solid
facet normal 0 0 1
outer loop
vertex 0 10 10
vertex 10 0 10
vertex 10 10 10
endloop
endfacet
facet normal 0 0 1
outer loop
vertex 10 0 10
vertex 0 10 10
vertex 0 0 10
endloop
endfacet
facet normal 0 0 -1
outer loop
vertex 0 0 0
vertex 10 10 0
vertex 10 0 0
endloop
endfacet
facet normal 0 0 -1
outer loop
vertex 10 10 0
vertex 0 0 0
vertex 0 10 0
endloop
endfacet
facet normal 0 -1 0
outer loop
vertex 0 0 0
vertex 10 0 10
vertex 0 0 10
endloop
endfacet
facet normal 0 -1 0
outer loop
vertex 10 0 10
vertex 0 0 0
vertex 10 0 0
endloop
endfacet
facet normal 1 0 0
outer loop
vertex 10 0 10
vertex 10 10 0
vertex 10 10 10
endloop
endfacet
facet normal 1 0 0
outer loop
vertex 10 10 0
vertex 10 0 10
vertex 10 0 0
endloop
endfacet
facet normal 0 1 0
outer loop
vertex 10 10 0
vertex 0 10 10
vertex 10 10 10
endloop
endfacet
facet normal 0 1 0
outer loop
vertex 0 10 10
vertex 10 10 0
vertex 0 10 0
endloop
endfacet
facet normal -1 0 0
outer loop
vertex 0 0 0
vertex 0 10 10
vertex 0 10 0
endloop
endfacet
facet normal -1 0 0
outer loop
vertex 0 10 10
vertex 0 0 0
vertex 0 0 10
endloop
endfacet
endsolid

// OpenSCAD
/*
 * Welcome to the Advent Calendar - Tutorial Edition - Part 01
 */

// This part will introduce how the tutorial is structured,so please hang
// in there for more interesting things to come over the following days.

// The tutorial has 15 parts, with each part containing multiple steps
// introducing features, or tips & tricks on how to use OpenSCAD.

// In the top of the script there's going to be a "step" variable that
// allows selecting the step that should be shown in the 3D View (or
// maybe sometimes in the Console Window).

step = 1; // [1:3]

/*** STEP 1 ***/

// In step 1 of this introduction, we will start with the classic
// "Hello World" example most computer language introductions start with
// (https://en.wikipedia.org/wiki/%22Hello,_World!%22_program).
//
// As we are in the world of 3D geometry, we will not actually use words,
// but one of the simplest geometric primitive, The Cube.
//
// OpenSCAD does not define any real world units, so we don't have
// millimeters, inches and so on. It's just a number, or maybe call it
// OpenSCAD units.
//
// Note that our cube is touching the origin (the point where all 3
// coordinates are zero) with one corner. The cube is fully in the first
// octant with all positive coordinates.
// https://en.wikipedia.org/wiki/Octant_(solid_geometry)
//
// => Press the F5 key (Preview) to show the cube.
// => Use the mouse in the 3D view to move and rotate the camera
// => Try the zoom and reset-view buttons below the 3D view
//
// Rotation: Click and hold the left mouse button in in the 3D
// view. Dragging the mouse will rotate the camera.
//
// Translation:  Click and hold the right mouse button. Dragging the
// mouse will move the camera left/right or up/down.
//
// Zoom: Using the mouse wheel, the distance between the camera and the
// model can be changed. This will zoom-in or zoom-out depending on the
// rotation direction of the mouse wheel.

if (step == 1) {

cube(10); // A cube with edges of 10 units.

}

/*** STEP 2 ***/

// In step 2, we have the same cube again, but instead of touching the
// origin with one corner, it's centered around the origin, so each of
// the corners of the cube is in a different octant.
//
// => Change the "step = 1" to "step = 2" at the top of the file
// => Press F5 to show the cube of step 2
//
// As alternative, you can activate the Customizer using the menu
// Window->Customizer and change the active value of the step variable
// there. This will not modify the value in the file.

if (step == 2) {

cube(10, center = true); // A centered cube with edges of 10 units.

}

/*** STEP 3 ***/

// In step 3, we again have a centered cube, but it is a bit smaller,
// the edges are only 5 units long.
//
// The notation [5, 5, 5] means we are giving each of the axes X, Y and
// Z a dedicated value. With all 3 values the same, we still get a cube.

if (step == 3) {

cube([5, 5, 5], center = true); // A cube with edges of 5 units.

}

/*** STEP 4 ***/

// What? Step 4? Yes, add another step to the file and for example create
// a flat cuboid with edge length of 30 for X, 20 for Y and just 1 for Z.
//
// If you are using the Customizer, you need to also change the "// [1:3]"
// comment on top of the file. This comment gives the Customizer the
// information which values are allowed for the step variable.



/*** THE END ***/

// That's it already for today. Now that you know how to follow the
// steps through the tutorial parts, we will start creating some more
// interesting things than just cubes.

/*********************************************************************/

// Written in 2024 by Torsten Paul <Torsten.Paul@gmx.de>
//
// To the extent possible under law, the author(s) have dedicated all
// copyright and related and neighboring rights to this software to the
// public domain worldwide. This software is distributed without any
// warranty.
//
// You should have received a copy of the CC0 Public Domain
// Dedication along with this software.
// If not, see <http://creativecommons.org/publicdomain/zero/1.0/>.
